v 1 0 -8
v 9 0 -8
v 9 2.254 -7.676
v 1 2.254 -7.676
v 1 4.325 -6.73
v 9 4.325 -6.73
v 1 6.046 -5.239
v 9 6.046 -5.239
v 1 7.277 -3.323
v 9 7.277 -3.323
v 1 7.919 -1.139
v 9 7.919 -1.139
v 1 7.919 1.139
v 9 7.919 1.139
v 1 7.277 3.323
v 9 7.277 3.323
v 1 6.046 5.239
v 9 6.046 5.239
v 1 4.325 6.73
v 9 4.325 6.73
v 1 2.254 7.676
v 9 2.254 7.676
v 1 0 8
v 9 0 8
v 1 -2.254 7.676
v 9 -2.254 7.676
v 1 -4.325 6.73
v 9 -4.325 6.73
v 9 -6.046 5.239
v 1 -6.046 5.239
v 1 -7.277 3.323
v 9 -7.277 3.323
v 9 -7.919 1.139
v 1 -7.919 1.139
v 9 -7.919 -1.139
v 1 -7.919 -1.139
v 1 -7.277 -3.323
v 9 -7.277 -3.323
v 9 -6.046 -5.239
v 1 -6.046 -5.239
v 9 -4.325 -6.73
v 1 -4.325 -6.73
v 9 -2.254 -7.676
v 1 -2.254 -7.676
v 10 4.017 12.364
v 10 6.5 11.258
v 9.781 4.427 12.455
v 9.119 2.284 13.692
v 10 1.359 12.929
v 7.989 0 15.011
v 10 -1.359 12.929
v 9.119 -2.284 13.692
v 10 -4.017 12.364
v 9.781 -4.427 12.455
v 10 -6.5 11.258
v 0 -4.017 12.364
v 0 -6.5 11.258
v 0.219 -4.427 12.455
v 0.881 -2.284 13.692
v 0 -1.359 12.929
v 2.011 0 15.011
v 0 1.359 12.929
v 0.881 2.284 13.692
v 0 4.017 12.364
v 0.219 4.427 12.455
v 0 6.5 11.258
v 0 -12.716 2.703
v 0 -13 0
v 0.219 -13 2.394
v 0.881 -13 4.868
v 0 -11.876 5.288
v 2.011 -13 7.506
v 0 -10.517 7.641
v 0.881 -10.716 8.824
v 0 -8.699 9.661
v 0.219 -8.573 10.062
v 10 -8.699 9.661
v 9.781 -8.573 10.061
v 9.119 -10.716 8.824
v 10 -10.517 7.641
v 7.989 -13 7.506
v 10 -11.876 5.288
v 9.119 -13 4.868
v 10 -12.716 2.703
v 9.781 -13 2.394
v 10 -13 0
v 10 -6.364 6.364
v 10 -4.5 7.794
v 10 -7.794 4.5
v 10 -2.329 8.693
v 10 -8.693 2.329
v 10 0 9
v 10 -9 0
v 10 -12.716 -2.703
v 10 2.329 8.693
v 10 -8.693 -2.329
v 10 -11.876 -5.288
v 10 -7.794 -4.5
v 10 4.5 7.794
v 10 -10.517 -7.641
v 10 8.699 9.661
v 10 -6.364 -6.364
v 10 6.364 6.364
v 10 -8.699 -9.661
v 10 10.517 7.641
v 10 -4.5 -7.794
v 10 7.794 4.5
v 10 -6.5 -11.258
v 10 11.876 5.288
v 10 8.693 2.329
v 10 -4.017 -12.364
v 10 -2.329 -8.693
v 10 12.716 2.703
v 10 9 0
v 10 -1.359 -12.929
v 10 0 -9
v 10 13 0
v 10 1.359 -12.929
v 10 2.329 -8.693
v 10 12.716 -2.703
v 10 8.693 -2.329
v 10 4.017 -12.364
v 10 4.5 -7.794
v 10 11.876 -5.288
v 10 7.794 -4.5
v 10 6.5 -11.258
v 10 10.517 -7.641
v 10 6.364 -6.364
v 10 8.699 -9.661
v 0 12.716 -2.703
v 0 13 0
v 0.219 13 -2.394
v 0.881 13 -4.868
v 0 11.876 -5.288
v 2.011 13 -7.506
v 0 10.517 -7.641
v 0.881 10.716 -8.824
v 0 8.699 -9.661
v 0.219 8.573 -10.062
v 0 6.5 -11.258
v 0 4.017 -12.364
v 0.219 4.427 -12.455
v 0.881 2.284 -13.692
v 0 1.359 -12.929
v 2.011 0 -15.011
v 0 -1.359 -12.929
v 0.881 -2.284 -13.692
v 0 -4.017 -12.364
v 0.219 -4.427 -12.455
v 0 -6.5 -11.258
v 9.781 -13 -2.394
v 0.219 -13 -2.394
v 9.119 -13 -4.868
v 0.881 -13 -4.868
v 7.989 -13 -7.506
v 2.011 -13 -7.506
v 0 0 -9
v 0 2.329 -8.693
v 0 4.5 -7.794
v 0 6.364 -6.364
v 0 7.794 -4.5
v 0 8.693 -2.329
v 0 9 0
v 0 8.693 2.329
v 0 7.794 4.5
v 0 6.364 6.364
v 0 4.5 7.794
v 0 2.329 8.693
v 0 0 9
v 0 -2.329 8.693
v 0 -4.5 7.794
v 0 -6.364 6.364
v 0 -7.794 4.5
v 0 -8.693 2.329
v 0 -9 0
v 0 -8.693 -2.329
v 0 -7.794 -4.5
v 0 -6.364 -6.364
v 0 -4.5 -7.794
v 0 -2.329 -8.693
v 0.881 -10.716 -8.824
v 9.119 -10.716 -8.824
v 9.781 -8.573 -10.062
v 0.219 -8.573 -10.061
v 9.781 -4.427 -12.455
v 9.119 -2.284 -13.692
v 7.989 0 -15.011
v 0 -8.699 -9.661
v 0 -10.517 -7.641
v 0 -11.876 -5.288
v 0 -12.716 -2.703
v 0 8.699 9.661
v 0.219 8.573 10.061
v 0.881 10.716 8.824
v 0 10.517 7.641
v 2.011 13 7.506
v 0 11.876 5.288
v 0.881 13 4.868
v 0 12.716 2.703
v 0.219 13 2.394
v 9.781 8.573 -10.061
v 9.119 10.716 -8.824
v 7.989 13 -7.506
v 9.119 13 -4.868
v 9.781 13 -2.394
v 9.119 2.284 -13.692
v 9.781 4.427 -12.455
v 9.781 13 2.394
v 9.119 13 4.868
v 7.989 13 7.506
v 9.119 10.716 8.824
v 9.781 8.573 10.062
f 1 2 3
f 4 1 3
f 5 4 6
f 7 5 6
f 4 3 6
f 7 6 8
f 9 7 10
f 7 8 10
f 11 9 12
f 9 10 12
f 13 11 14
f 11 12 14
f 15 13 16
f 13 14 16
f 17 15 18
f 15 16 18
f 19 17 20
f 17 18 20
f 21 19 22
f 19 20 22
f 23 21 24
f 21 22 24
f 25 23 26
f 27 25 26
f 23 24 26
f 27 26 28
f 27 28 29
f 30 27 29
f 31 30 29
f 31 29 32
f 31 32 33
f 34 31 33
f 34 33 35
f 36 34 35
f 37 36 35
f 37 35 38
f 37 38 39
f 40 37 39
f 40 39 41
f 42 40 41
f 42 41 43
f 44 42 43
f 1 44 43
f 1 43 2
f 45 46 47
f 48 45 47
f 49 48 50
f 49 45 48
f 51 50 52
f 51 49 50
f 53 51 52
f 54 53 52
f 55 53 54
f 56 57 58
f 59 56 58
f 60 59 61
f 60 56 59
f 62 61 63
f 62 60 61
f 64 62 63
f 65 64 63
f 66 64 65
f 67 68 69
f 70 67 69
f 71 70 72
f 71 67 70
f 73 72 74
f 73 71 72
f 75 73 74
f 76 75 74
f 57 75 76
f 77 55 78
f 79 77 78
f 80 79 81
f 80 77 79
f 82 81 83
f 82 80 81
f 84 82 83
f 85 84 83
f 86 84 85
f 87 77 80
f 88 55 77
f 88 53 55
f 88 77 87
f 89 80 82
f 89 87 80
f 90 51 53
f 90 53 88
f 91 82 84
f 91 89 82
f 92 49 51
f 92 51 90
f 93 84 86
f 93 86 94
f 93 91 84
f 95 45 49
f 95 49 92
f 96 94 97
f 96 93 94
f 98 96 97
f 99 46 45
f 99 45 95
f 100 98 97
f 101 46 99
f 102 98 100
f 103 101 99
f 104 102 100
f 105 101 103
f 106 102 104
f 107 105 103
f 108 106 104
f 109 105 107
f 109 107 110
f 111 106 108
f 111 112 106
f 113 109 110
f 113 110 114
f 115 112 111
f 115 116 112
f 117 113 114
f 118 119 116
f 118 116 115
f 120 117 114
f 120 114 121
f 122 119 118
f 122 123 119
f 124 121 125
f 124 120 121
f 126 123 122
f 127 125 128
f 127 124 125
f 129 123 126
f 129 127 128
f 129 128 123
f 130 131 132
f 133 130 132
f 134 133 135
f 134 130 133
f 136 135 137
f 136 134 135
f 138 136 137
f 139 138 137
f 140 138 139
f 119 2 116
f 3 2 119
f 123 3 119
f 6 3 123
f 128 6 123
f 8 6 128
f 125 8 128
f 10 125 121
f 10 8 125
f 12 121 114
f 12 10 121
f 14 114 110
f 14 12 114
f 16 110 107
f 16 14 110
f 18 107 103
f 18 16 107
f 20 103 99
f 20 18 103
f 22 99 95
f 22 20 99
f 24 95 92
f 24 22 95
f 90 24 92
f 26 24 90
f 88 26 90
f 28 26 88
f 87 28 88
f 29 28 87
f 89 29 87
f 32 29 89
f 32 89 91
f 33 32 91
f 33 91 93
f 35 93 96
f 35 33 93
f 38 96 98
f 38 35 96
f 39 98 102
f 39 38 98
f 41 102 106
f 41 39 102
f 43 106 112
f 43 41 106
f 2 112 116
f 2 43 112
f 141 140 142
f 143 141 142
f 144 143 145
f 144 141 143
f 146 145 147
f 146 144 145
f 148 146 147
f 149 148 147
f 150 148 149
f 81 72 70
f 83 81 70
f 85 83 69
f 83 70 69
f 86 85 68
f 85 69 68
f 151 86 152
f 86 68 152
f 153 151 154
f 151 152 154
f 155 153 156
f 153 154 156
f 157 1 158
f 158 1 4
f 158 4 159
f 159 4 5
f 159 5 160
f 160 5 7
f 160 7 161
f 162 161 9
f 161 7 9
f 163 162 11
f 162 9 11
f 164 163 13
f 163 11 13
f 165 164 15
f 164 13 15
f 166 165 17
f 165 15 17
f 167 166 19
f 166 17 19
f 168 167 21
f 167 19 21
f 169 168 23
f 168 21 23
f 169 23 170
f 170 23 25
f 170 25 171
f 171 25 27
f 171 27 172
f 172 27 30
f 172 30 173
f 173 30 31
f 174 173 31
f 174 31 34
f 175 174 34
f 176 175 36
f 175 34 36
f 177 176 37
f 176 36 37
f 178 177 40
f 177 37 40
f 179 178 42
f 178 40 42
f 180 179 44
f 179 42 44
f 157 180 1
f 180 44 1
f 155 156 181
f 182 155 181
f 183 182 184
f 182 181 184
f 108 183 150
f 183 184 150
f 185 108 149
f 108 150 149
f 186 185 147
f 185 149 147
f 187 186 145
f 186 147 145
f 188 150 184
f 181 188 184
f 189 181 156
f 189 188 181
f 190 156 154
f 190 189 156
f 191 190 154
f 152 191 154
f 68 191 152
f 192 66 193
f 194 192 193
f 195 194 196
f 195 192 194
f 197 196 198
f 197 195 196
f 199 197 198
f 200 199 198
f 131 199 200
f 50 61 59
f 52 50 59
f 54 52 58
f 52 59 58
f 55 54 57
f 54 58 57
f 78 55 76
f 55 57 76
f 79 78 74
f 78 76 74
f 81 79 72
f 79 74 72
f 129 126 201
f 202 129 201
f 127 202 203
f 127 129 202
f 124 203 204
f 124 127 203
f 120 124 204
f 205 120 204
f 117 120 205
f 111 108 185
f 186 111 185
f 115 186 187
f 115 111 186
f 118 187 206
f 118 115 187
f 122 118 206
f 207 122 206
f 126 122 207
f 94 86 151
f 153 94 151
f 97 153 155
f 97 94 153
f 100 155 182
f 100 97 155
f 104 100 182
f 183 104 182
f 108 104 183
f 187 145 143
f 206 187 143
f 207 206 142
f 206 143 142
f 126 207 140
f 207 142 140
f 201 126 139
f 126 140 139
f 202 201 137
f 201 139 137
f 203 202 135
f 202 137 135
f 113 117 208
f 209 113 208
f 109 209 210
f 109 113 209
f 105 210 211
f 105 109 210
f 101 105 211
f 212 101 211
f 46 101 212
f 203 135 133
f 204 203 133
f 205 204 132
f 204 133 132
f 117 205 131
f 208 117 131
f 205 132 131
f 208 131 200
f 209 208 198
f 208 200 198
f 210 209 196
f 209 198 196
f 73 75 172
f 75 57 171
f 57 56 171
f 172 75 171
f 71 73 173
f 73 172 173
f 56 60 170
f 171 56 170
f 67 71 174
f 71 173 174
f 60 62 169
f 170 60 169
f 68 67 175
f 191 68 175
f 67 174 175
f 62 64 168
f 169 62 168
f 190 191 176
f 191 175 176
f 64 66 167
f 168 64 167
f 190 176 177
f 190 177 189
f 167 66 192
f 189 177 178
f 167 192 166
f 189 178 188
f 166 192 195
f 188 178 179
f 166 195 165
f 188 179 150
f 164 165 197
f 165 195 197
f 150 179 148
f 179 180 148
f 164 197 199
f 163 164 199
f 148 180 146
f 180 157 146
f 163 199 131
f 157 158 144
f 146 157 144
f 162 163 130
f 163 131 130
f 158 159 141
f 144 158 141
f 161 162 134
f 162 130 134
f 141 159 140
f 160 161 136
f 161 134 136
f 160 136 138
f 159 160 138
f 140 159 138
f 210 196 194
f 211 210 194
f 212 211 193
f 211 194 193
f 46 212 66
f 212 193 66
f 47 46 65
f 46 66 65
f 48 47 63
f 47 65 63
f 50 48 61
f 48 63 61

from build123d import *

# Parameters (mm, degrees)
EXTRUDE_1_DEPTH     = 10
SKETCH_2_R          = 8
CUT_EXTRUDE_1_DEPTH = 20
CHAMFER_1_SIZE      = 1
SKETCH_3_OUTSIDE_W  = 130.214
SKETCH_3_OUTSIDE_H  = 126.192
SKETCH_3_OUTSIDE_R  = 13
CUT_EXTRUDE_2_DEPTH = 45
CUT_EXTRUDE_2_DRAFT = -45
SKETCH_4_OUTSIDE_W  = 130.214
SKETCH_4_OUTSIDE_H  = 126.192
SKETCH_4_OUTSIDE_R  = 13
CUT_EXTRUDE_3_DEPTH = 45
CUT_EXTRUDE_3_DRAFT = -45


with BuildPart() as part:
    # 草图1 → 凸台-拉伸1 (new body)
    with BuildSketch(Plane(origin=(0, 0, 0), x_dir=(0, 0, -1), z_dir=(1, 0, 0))):
        Polygon((-7.505553499, -13), (7.505553499, -13), (15.011106999, 0), (7.505553499, 13), (-7.505553499, 13), (-15.011106999, 0), align=None)
    extrude(amount=EXTRUDE_1_DEPTH)

    # 草图2 → 切除-拉伸1 (cut)
    with BuildSketch(Plane(origin=(10, 0, 0), x_dir=(0, 0, -1), z_dir=(1, 0, 0))):
        Circle(SKETCH_2_R)
    extrude(amount=-CUT_EXTRUDE_1_DEPTH, mode=Mode.SUBTRACT)

    # 倒角1
    chamfer_1_edges = [part.edges().sort_by_distance(p)[0] for p in [
        (0, 0, 8),
        (10, 0, 8),
    ]]
    chamfer(chamfer_1_edges, length=CHAMFER_1_SIZE)


with BuildPart() as cut_extrude_2_tool:
    # 草图3 outside → 切除-拉伸2 (with draft: the straight prism first)
    with BuildSketch(Plane(origin=(10, 0, 0), x_dir=(0, 0, -1), z_dir=(1, 0, 0))):
        Rectangle(SKETCH_3_OUTSIDE_W, SKETCH_3_OUTSIDE_H)
        Circle(SKETCH_3_OUTSIDE_R, mode=Mode.SUBTRACT)
    extrude(amount=-CUT_EXTRUDE_2_DEPTH)
    # 切除-拉伸2: the draft: its side faces are tilted about the plane it starts from
    cut_extrude_2_sides = [cut_extrude_2_tool.faces().sort_by_distance(p)[0] for p in [
        (-12.5, -63.096, 0),
        (-12.5, 0, -65.107),
        (-12.5, 63.096, 0),
        (-12.5, 0, 65.107),
        (-12.5, 0, 13),
    ]]
    draft(cut_extrude_2_sides, Plane(origin=(10, 0, 0), x_dir=(0, 0, -1), z_dir=(1, 0, 0)), CUT_EXTRUDE_2_DRAFT)


with BuildPart() as part_1:
    add(part.part)

    # 切除-拉伸2: cut by cut_extrude_2_tool
    add(cut_extrude_2_tool.part, mode=Mode.SUBTRACT)


with BuildPart() as cut_extrude_3_tool:
    # 草图4 outside → 切除-拉伸3 (with draft: the straight prism first)
    with BuildSketch(Plane.ZY):
        Rectangle(SKETCH_4_OUTSIDE_W, SKETCH_4_OUTSIDE_H)
        Circle(SKETCH_4_OUTSIDE_R, mode=Mode.SUBTRACT)
    extrude(amount=-CUT_EXTRUDE_3_DEPTH)
    # 切除-拉伸3: the draft: its side faces are tilted about the plane it starts from
    cut_extrude_3_sides = [cut_extrude_3_tool.faces().sort_by_distance(p)[0] for p in [
        (22.5, -63.096, 0),
        (22.5, 0, 65.107),
        (22.5, 63.096, 0),
        (22.5, 0, -65.107),
        (22.5, 0, -13),
    ]]
    draft(cut_extrude_3_sides, Plane.ZY, CUT_EXTRUDE_3_DRAFT)


with BuildPart() as part_2:
    add(part_1.part)

    # 切除-拉伸3: cut by cut_extrude_3_tool
    add(cut_extrude_3_tool.part, mode=Mode.SUBTRACT)


solid = part_2.part
